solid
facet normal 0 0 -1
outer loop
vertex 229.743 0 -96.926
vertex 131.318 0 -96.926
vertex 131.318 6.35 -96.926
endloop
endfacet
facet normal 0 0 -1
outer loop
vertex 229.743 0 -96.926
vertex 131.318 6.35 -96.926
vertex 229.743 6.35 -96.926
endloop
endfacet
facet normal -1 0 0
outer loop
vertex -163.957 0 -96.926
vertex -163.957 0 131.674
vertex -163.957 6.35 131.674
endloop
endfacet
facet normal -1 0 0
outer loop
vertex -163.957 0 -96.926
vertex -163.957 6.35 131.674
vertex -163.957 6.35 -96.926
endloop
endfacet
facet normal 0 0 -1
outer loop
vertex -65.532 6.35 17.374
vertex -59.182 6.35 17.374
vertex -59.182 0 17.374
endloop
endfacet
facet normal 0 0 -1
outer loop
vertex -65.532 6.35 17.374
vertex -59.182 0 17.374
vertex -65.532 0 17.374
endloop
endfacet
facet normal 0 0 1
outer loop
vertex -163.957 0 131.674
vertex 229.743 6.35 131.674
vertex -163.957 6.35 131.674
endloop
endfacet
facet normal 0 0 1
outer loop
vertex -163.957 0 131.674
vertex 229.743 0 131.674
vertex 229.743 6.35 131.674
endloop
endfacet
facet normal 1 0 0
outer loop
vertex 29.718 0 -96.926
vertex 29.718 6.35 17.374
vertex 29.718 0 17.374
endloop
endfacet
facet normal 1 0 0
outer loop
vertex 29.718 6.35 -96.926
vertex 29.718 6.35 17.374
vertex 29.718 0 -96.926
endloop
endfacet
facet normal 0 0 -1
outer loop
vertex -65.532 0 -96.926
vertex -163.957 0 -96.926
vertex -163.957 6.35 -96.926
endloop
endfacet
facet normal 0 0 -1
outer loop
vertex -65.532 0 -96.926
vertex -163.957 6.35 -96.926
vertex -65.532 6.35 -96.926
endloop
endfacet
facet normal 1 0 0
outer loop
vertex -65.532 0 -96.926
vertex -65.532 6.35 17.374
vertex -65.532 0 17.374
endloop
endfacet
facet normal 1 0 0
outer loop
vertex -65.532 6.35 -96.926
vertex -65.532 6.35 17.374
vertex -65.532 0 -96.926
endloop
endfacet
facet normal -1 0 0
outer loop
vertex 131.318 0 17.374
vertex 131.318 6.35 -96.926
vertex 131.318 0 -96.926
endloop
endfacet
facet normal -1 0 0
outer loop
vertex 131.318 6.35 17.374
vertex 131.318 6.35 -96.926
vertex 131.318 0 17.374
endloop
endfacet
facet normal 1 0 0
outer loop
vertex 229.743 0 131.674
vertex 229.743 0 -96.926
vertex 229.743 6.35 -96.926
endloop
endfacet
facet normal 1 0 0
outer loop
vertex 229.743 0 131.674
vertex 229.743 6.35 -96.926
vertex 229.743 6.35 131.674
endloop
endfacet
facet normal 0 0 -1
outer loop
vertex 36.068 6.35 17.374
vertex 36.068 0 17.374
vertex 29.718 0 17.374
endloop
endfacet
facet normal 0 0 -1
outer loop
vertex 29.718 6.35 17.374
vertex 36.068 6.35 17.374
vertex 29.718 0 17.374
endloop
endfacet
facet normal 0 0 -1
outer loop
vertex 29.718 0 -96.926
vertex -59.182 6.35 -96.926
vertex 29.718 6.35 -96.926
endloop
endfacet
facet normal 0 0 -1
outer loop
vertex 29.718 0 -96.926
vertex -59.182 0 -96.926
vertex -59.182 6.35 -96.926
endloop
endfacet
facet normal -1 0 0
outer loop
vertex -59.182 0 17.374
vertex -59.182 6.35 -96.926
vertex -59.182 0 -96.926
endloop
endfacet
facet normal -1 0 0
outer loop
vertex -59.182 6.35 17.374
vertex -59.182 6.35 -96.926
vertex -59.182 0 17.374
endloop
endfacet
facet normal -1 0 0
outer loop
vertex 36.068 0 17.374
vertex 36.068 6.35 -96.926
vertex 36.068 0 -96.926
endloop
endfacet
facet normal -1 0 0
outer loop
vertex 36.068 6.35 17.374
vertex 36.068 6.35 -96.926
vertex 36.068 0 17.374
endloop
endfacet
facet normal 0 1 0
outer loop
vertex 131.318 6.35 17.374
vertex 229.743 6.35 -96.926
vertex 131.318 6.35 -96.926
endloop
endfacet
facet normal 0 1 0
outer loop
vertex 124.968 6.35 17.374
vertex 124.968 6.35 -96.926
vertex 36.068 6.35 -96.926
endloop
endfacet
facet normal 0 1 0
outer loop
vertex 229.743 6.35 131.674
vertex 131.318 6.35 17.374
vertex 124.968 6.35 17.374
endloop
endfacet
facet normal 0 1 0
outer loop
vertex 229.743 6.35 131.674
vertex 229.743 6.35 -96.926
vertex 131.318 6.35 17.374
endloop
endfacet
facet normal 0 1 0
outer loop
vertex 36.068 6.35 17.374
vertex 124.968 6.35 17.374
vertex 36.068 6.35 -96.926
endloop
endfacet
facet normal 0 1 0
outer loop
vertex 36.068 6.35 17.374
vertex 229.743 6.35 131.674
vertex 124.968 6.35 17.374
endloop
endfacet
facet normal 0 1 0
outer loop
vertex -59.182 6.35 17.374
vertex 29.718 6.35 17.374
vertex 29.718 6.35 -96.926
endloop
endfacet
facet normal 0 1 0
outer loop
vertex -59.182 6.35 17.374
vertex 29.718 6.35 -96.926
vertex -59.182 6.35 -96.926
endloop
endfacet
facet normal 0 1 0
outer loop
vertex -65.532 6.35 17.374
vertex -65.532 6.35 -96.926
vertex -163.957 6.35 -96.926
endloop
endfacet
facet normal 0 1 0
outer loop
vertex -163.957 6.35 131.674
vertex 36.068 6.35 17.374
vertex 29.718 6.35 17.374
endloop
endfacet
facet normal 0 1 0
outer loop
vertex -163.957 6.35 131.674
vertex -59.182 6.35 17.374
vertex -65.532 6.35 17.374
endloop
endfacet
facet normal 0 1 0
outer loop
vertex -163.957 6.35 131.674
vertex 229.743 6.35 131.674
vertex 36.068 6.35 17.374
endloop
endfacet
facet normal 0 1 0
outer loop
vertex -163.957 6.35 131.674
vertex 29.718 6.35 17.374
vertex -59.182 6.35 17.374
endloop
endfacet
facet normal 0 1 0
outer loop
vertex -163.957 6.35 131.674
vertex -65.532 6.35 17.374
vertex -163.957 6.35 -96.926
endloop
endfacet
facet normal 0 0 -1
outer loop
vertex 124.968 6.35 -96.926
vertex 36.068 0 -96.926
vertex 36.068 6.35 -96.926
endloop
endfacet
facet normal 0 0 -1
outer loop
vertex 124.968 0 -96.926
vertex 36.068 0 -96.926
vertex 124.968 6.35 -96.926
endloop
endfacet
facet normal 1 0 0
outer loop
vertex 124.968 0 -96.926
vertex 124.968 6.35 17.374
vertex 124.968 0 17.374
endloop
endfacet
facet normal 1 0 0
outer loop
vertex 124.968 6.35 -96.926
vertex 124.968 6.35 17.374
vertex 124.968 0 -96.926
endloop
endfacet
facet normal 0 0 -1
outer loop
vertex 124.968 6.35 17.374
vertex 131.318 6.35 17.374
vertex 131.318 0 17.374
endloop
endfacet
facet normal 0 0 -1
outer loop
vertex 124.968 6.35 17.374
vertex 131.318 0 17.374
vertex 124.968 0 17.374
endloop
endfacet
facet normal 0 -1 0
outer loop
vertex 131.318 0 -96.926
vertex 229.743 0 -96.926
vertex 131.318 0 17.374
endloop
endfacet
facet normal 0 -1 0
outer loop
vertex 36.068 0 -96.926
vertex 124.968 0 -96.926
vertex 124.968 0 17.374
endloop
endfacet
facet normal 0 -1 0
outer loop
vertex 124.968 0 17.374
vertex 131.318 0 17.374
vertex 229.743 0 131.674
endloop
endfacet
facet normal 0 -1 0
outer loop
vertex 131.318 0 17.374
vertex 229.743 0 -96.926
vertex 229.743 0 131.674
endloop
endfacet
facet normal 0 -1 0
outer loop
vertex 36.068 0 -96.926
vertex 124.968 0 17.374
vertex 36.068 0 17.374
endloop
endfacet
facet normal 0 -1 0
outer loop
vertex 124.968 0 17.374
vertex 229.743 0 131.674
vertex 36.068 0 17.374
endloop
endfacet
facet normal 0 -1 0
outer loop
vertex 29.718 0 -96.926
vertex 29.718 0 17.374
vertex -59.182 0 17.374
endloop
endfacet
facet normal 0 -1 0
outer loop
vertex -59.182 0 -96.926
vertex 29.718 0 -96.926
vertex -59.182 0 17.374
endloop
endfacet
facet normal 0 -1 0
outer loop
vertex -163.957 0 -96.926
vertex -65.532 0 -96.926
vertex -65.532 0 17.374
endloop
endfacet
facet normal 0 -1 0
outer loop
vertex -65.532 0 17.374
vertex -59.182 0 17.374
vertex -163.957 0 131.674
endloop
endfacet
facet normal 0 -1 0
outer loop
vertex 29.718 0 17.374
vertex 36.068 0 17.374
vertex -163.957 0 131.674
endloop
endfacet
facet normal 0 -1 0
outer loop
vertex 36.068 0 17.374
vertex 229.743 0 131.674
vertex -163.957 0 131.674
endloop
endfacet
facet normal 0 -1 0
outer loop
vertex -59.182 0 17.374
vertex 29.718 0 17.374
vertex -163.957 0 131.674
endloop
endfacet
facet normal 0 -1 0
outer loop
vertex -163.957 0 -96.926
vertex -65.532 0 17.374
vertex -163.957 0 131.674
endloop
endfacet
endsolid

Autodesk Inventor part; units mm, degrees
ref_plane "YZ Plane" through (0, 0, 0) normal (1, 0, 0) x (0, 1, 0)
ref_plane "XZ Plane" through (0, 0, 0) normal (0, 1, 0) x (-1, 0, 0)
ref_plane "XY Plane" through (0, 0, 0) normal (0, 0, 1) x (1, 0, 0)
sketch "Sketch1" plane through (0, 0, 0) normal (0, 1, 0) x (-1, 0, 0)
  line L0 (163.957, -96.9264) -> (-229.743, -96.9264)
  line L1 (-229.743, -96.9264) -> (-229.743, 131.6736)
  line L2 (-229.743, 131.6736) -> (163.957, 131.6736)
  line L3 (163.957, 131.6736) -> (163.957, -96.9264)
  point P0 (0, 0)
  dimension "d0" = 228.6
  dimension "d1" = 393.7
extrude "Board" add sketch "Sketch1" along normal blind 6.35
sketch "Sketch2" plane through (0, 6.35, 0) normal (0, 1, 0) x (1, 0, 0)
  line L0 (-65.532, 96.9264) -> (-59.182, 96.9264)
  line L1 (-59.182, 96.9264) -> (-59.182, -17.3736)
  line L2 (-59.182, -17.3736) -> (-65.532, -17.3736)
  line L3 (-65.532, -17.3736) -> (-65.532, 96.9264)
  line L4 (229.743, 96.9264) -> (-163.957, 96.9264) projected
  line L5 (-163.957, 96.9264) -> (-163.957, -131.6736) projected
  line L6 (29.718, 96.9264) -> (36.068, 96.9264)
  line L7 (36.068, 96.9264) -> (36.068, -17.3736)
  line L8 (36.068, -17.3736) -> (29.718, -17.3736)
  line L9 (29.718, -17.3736) -> (29.718, 96.9264)
  line L10 (124.968, 96.9264) -> (131.318, 96.9264)
  line L11 (131.318, 96.9264) -> (131.318, -17.3736)
  line L12 (131.318, -17.3736) -> (124.968, -17.3736)
  line L13 (124.968, -17.3736) -> (124.968, 96.9264)
  line L14 (229.743, -131.6736) -> (229.743, 96.9264) projected
  point P0 (0, 0)
  dimension "d4" = 6.35
  dimension "d5" = 114.3
  dimension "d6" = 98.425
  dimension "d7" = 6.35
  dimension "d8" = 114.3
  dimension "d10" = 6.35
  dimension "d11" = 114.3
  dimension "d13" = 88.9
  dimension "d14" = 88.9
  dimension "d25" = 98.425
extrude "Stop Dados" cut sketch "Sketch2" against normal blind 6.35
equation "\"d5\" = 0.5 * d0"
equation "\"d8\" = 0.5 * d9"
equation "\"d11\" = 0.5 * d12"
equation "\"d9\" = 228.6"
equation "\"d12\" = 228.6"
properties part number "Wine Rack Horizontal"
